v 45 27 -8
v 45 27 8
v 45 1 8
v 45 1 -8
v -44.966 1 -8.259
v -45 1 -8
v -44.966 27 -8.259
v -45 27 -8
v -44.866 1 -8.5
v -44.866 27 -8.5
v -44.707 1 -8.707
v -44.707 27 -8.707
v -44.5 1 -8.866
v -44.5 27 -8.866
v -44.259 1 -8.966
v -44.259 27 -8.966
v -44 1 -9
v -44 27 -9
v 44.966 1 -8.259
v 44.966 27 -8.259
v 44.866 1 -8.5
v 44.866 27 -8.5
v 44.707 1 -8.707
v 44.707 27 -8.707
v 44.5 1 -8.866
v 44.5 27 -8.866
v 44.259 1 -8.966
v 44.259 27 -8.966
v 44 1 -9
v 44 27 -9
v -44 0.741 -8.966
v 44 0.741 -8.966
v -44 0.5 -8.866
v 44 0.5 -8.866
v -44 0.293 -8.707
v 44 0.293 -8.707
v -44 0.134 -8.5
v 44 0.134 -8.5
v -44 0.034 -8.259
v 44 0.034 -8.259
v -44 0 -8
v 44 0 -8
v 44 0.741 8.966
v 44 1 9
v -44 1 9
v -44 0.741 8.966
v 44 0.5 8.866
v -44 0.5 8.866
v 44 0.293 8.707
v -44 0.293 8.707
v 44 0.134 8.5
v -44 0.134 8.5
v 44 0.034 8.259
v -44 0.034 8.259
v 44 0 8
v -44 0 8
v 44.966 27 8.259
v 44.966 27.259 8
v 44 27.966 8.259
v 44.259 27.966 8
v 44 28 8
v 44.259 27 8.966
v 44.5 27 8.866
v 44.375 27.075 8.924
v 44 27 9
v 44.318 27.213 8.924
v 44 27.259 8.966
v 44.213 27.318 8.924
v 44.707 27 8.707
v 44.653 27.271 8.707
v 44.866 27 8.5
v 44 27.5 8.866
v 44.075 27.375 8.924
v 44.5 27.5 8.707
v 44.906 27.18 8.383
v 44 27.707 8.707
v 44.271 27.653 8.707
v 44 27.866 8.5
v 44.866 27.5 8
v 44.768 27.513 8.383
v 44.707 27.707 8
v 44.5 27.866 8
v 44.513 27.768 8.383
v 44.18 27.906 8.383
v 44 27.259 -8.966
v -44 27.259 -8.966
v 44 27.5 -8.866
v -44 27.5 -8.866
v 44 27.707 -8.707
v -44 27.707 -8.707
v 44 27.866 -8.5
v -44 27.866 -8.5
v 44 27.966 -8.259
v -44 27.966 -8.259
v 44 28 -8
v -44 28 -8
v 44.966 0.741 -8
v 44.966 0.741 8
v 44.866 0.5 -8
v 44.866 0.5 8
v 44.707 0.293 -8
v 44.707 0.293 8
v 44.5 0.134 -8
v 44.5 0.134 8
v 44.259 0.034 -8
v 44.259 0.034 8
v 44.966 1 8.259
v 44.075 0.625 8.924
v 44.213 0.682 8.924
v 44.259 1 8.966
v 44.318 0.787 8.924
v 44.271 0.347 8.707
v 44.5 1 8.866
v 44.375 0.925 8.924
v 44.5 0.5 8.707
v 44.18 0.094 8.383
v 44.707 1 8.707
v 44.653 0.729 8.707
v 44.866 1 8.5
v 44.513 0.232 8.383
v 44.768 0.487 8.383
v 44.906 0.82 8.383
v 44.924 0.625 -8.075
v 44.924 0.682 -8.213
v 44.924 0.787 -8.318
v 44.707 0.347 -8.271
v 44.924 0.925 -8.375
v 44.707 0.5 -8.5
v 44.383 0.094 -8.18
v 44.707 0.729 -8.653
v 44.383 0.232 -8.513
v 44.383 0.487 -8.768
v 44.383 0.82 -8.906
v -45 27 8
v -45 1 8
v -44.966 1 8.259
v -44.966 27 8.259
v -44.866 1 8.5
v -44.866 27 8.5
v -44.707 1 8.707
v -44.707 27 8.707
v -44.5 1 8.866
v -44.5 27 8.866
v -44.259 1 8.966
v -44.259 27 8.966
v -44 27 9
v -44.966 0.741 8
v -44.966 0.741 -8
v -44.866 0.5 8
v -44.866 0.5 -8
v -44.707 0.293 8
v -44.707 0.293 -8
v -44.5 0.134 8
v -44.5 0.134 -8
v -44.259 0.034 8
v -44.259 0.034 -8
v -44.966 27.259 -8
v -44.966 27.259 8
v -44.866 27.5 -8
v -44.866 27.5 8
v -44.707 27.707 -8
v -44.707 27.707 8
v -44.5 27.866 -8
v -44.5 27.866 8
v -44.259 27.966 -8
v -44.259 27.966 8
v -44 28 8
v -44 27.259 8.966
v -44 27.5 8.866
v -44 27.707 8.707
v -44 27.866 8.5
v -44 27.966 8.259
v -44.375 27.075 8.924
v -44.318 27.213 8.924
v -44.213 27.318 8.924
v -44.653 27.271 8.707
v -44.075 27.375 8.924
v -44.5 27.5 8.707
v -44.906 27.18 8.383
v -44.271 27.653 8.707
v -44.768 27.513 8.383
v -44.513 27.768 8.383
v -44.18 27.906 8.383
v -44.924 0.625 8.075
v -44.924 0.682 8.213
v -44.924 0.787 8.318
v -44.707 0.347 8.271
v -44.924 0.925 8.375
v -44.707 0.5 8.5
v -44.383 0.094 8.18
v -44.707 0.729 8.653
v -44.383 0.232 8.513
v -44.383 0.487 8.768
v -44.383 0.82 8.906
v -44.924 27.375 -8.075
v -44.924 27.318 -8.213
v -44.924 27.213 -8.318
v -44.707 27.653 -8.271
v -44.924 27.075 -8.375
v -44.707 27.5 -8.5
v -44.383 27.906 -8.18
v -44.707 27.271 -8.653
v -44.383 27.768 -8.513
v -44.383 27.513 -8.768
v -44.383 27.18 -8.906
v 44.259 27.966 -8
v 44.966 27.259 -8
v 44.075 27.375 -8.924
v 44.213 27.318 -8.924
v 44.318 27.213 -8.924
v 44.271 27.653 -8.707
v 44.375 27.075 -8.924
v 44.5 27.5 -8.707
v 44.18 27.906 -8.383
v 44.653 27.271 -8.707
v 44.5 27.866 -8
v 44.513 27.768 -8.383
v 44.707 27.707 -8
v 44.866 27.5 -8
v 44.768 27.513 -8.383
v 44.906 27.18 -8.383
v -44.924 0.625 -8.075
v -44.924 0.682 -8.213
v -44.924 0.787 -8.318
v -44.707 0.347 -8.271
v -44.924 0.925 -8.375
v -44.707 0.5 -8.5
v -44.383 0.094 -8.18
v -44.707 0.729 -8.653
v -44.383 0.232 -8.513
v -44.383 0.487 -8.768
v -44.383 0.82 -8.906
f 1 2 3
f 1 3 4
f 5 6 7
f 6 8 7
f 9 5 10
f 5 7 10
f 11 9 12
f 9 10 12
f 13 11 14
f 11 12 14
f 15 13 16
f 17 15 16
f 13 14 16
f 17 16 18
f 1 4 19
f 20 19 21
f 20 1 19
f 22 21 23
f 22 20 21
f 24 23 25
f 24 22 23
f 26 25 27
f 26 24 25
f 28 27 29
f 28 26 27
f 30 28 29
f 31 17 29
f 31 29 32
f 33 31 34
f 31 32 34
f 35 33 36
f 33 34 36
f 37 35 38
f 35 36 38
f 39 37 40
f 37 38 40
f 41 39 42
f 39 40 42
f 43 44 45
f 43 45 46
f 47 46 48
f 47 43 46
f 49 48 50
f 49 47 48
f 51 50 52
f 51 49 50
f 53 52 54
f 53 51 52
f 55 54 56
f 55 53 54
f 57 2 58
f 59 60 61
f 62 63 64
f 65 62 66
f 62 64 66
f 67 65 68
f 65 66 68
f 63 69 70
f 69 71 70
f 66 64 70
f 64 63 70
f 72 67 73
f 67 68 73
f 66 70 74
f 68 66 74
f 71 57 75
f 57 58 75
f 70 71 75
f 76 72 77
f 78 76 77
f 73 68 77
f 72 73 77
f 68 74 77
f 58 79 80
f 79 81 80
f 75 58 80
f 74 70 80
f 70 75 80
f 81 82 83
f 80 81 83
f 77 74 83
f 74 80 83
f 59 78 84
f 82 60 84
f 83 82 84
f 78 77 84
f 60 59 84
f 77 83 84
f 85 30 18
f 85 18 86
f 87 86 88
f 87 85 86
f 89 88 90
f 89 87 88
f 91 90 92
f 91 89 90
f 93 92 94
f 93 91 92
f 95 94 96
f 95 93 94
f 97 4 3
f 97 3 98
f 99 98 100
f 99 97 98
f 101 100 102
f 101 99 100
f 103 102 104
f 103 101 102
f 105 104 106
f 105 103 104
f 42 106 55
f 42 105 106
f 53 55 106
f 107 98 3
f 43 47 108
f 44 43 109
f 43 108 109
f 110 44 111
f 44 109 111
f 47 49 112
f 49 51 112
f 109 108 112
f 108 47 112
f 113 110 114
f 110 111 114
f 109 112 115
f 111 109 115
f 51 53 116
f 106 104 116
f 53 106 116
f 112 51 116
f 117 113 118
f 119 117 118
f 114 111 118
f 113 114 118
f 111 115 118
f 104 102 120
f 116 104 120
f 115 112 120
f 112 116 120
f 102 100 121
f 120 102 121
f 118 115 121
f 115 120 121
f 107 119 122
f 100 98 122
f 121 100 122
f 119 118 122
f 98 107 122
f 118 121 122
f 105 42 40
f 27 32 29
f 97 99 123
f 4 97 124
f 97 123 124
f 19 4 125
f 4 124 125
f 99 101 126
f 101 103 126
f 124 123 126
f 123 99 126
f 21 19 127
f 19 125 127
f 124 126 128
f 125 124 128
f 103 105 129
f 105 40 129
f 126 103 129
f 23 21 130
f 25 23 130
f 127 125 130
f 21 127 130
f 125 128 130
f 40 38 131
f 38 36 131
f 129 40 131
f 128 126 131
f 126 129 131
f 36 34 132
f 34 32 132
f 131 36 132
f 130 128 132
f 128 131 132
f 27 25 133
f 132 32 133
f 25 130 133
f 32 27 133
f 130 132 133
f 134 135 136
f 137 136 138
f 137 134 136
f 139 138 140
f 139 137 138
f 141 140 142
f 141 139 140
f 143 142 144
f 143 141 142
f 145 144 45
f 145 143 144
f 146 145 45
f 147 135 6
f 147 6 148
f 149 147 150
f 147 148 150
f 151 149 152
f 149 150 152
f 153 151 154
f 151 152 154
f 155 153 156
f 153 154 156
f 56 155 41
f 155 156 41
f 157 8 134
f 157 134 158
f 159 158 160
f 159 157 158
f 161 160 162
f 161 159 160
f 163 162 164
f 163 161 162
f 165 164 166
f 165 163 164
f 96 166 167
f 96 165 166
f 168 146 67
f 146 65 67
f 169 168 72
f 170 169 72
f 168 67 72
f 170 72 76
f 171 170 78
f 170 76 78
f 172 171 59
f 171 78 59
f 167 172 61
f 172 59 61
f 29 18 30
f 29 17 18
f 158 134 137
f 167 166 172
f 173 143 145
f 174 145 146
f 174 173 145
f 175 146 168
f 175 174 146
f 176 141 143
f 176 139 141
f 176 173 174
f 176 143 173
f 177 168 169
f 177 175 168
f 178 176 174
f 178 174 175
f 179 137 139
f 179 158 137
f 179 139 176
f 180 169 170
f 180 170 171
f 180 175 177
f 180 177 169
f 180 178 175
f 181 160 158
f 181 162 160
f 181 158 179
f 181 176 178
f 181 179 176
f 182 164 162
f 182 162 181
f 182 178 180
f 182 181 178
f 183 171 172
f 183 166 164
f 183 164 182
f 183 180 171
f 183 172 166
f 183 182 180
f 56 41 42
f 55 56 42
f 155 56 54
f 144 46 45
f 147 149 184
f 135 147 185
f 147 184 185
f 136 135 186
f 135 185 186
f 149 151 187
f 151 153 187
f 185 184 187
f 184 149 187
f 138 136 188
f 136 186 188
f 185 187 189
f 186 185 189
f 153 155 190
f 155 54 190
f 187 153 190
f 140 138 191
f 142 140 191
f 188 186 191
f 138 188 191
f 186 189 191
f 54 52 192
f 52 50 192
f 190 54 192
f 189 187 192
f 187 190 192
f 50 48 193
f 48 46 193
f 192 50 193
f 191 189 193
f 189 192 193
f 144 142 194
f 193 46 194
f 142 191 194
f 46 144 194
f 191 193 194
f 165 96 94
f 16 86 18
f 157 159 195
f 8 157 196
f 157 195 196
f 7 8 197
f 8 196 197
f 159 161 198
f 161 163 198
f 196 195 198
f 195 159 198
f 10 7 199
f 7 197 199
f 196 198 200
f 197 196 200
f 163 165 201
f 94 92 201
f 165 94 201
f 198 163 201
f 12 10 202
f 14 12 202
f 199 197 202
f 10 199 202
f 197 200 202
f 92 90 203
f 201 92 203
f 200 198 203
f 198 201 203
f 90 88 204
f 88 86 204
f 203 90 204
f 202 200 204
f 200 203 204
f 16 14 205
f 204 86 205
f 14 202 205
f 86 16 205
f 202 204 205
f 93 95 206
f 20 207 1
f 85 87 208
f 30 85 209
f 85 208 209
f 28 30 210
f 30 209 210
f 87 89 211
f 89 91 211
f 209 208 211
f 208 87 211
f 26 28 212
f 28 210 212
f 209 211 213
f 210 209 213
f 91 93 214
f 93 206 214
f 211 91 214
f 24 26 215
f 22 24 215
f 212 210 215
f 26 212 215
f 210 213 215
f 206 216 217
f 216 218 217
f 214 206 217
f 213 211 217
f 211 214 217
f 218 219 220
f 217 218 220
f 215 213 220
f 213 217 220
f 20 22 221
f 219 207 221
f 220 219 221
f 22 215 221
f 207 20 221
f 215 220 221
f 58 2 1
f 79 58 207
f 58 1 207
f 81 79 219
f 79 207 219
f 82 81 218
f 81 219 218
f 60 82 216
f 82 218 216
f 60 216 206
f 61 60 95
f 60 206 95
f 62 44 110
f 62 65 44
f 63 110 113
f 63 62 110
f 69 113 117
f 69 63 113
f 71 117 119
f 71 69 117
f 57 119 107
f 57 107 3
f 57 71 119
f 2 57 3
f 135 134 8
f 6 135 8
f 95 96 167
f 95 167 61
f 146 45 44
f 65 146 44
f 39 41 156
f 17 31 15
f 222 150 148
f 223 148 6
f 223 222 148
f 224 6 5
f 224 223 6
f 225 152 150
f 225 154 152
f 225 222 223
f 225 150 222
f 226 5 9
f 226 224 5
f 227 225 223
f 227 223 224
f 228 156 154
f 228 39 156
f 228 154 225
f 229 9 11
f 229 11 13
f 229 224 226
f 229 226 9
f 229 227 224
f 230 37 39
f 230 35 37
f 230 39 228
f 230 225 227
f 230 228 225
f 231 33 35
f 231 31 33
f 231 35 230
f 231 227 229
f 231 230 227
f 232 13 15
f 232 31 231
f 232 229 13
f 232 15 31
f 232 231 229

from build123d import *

# Parameters (mm, degrees)
SCHIZZO1_W                   = 90
SCHIZZO1_H                   = 18
ESTRUSIONE_ESTRUSIONE1_DEPTH = 28
RACCORDO1_R                  = 1


with BuildPart() as part:
    # Schizzo1 → Estrusione-Estrusione1 (new body)
    with BuildSketch(Plane(origin=(0, 0, 0), x_dir=(1, 0, 0), z_dir=(0, 1, 0))):
        Rectangle(SCHIZZO1_W, SCHIZZO1_H)
    extrude(amount=ESTRUSIONE_ESTRUSIONE1_DEPTH)

    # Raccordo1
    raccordo1_edges = [part.edges().sort_by_distance(p)[0] for p in [
        (45, 28, 0),
        (0, 28, -9),
        (-45, 28, 0),
        (0, 0, -9),
        (45, 0, 0),
        (0, 0, 9),
        (-45, 0, 0),
        (-45, 14, -9),
        (45, 14, -9),
        (45, 14, 9),
        (-45, 14, 9),
        (0, 28, 9),
    ]]
    fillet(raccordo1_edges, radius=RACCORDO1_R)


solid = part.part
